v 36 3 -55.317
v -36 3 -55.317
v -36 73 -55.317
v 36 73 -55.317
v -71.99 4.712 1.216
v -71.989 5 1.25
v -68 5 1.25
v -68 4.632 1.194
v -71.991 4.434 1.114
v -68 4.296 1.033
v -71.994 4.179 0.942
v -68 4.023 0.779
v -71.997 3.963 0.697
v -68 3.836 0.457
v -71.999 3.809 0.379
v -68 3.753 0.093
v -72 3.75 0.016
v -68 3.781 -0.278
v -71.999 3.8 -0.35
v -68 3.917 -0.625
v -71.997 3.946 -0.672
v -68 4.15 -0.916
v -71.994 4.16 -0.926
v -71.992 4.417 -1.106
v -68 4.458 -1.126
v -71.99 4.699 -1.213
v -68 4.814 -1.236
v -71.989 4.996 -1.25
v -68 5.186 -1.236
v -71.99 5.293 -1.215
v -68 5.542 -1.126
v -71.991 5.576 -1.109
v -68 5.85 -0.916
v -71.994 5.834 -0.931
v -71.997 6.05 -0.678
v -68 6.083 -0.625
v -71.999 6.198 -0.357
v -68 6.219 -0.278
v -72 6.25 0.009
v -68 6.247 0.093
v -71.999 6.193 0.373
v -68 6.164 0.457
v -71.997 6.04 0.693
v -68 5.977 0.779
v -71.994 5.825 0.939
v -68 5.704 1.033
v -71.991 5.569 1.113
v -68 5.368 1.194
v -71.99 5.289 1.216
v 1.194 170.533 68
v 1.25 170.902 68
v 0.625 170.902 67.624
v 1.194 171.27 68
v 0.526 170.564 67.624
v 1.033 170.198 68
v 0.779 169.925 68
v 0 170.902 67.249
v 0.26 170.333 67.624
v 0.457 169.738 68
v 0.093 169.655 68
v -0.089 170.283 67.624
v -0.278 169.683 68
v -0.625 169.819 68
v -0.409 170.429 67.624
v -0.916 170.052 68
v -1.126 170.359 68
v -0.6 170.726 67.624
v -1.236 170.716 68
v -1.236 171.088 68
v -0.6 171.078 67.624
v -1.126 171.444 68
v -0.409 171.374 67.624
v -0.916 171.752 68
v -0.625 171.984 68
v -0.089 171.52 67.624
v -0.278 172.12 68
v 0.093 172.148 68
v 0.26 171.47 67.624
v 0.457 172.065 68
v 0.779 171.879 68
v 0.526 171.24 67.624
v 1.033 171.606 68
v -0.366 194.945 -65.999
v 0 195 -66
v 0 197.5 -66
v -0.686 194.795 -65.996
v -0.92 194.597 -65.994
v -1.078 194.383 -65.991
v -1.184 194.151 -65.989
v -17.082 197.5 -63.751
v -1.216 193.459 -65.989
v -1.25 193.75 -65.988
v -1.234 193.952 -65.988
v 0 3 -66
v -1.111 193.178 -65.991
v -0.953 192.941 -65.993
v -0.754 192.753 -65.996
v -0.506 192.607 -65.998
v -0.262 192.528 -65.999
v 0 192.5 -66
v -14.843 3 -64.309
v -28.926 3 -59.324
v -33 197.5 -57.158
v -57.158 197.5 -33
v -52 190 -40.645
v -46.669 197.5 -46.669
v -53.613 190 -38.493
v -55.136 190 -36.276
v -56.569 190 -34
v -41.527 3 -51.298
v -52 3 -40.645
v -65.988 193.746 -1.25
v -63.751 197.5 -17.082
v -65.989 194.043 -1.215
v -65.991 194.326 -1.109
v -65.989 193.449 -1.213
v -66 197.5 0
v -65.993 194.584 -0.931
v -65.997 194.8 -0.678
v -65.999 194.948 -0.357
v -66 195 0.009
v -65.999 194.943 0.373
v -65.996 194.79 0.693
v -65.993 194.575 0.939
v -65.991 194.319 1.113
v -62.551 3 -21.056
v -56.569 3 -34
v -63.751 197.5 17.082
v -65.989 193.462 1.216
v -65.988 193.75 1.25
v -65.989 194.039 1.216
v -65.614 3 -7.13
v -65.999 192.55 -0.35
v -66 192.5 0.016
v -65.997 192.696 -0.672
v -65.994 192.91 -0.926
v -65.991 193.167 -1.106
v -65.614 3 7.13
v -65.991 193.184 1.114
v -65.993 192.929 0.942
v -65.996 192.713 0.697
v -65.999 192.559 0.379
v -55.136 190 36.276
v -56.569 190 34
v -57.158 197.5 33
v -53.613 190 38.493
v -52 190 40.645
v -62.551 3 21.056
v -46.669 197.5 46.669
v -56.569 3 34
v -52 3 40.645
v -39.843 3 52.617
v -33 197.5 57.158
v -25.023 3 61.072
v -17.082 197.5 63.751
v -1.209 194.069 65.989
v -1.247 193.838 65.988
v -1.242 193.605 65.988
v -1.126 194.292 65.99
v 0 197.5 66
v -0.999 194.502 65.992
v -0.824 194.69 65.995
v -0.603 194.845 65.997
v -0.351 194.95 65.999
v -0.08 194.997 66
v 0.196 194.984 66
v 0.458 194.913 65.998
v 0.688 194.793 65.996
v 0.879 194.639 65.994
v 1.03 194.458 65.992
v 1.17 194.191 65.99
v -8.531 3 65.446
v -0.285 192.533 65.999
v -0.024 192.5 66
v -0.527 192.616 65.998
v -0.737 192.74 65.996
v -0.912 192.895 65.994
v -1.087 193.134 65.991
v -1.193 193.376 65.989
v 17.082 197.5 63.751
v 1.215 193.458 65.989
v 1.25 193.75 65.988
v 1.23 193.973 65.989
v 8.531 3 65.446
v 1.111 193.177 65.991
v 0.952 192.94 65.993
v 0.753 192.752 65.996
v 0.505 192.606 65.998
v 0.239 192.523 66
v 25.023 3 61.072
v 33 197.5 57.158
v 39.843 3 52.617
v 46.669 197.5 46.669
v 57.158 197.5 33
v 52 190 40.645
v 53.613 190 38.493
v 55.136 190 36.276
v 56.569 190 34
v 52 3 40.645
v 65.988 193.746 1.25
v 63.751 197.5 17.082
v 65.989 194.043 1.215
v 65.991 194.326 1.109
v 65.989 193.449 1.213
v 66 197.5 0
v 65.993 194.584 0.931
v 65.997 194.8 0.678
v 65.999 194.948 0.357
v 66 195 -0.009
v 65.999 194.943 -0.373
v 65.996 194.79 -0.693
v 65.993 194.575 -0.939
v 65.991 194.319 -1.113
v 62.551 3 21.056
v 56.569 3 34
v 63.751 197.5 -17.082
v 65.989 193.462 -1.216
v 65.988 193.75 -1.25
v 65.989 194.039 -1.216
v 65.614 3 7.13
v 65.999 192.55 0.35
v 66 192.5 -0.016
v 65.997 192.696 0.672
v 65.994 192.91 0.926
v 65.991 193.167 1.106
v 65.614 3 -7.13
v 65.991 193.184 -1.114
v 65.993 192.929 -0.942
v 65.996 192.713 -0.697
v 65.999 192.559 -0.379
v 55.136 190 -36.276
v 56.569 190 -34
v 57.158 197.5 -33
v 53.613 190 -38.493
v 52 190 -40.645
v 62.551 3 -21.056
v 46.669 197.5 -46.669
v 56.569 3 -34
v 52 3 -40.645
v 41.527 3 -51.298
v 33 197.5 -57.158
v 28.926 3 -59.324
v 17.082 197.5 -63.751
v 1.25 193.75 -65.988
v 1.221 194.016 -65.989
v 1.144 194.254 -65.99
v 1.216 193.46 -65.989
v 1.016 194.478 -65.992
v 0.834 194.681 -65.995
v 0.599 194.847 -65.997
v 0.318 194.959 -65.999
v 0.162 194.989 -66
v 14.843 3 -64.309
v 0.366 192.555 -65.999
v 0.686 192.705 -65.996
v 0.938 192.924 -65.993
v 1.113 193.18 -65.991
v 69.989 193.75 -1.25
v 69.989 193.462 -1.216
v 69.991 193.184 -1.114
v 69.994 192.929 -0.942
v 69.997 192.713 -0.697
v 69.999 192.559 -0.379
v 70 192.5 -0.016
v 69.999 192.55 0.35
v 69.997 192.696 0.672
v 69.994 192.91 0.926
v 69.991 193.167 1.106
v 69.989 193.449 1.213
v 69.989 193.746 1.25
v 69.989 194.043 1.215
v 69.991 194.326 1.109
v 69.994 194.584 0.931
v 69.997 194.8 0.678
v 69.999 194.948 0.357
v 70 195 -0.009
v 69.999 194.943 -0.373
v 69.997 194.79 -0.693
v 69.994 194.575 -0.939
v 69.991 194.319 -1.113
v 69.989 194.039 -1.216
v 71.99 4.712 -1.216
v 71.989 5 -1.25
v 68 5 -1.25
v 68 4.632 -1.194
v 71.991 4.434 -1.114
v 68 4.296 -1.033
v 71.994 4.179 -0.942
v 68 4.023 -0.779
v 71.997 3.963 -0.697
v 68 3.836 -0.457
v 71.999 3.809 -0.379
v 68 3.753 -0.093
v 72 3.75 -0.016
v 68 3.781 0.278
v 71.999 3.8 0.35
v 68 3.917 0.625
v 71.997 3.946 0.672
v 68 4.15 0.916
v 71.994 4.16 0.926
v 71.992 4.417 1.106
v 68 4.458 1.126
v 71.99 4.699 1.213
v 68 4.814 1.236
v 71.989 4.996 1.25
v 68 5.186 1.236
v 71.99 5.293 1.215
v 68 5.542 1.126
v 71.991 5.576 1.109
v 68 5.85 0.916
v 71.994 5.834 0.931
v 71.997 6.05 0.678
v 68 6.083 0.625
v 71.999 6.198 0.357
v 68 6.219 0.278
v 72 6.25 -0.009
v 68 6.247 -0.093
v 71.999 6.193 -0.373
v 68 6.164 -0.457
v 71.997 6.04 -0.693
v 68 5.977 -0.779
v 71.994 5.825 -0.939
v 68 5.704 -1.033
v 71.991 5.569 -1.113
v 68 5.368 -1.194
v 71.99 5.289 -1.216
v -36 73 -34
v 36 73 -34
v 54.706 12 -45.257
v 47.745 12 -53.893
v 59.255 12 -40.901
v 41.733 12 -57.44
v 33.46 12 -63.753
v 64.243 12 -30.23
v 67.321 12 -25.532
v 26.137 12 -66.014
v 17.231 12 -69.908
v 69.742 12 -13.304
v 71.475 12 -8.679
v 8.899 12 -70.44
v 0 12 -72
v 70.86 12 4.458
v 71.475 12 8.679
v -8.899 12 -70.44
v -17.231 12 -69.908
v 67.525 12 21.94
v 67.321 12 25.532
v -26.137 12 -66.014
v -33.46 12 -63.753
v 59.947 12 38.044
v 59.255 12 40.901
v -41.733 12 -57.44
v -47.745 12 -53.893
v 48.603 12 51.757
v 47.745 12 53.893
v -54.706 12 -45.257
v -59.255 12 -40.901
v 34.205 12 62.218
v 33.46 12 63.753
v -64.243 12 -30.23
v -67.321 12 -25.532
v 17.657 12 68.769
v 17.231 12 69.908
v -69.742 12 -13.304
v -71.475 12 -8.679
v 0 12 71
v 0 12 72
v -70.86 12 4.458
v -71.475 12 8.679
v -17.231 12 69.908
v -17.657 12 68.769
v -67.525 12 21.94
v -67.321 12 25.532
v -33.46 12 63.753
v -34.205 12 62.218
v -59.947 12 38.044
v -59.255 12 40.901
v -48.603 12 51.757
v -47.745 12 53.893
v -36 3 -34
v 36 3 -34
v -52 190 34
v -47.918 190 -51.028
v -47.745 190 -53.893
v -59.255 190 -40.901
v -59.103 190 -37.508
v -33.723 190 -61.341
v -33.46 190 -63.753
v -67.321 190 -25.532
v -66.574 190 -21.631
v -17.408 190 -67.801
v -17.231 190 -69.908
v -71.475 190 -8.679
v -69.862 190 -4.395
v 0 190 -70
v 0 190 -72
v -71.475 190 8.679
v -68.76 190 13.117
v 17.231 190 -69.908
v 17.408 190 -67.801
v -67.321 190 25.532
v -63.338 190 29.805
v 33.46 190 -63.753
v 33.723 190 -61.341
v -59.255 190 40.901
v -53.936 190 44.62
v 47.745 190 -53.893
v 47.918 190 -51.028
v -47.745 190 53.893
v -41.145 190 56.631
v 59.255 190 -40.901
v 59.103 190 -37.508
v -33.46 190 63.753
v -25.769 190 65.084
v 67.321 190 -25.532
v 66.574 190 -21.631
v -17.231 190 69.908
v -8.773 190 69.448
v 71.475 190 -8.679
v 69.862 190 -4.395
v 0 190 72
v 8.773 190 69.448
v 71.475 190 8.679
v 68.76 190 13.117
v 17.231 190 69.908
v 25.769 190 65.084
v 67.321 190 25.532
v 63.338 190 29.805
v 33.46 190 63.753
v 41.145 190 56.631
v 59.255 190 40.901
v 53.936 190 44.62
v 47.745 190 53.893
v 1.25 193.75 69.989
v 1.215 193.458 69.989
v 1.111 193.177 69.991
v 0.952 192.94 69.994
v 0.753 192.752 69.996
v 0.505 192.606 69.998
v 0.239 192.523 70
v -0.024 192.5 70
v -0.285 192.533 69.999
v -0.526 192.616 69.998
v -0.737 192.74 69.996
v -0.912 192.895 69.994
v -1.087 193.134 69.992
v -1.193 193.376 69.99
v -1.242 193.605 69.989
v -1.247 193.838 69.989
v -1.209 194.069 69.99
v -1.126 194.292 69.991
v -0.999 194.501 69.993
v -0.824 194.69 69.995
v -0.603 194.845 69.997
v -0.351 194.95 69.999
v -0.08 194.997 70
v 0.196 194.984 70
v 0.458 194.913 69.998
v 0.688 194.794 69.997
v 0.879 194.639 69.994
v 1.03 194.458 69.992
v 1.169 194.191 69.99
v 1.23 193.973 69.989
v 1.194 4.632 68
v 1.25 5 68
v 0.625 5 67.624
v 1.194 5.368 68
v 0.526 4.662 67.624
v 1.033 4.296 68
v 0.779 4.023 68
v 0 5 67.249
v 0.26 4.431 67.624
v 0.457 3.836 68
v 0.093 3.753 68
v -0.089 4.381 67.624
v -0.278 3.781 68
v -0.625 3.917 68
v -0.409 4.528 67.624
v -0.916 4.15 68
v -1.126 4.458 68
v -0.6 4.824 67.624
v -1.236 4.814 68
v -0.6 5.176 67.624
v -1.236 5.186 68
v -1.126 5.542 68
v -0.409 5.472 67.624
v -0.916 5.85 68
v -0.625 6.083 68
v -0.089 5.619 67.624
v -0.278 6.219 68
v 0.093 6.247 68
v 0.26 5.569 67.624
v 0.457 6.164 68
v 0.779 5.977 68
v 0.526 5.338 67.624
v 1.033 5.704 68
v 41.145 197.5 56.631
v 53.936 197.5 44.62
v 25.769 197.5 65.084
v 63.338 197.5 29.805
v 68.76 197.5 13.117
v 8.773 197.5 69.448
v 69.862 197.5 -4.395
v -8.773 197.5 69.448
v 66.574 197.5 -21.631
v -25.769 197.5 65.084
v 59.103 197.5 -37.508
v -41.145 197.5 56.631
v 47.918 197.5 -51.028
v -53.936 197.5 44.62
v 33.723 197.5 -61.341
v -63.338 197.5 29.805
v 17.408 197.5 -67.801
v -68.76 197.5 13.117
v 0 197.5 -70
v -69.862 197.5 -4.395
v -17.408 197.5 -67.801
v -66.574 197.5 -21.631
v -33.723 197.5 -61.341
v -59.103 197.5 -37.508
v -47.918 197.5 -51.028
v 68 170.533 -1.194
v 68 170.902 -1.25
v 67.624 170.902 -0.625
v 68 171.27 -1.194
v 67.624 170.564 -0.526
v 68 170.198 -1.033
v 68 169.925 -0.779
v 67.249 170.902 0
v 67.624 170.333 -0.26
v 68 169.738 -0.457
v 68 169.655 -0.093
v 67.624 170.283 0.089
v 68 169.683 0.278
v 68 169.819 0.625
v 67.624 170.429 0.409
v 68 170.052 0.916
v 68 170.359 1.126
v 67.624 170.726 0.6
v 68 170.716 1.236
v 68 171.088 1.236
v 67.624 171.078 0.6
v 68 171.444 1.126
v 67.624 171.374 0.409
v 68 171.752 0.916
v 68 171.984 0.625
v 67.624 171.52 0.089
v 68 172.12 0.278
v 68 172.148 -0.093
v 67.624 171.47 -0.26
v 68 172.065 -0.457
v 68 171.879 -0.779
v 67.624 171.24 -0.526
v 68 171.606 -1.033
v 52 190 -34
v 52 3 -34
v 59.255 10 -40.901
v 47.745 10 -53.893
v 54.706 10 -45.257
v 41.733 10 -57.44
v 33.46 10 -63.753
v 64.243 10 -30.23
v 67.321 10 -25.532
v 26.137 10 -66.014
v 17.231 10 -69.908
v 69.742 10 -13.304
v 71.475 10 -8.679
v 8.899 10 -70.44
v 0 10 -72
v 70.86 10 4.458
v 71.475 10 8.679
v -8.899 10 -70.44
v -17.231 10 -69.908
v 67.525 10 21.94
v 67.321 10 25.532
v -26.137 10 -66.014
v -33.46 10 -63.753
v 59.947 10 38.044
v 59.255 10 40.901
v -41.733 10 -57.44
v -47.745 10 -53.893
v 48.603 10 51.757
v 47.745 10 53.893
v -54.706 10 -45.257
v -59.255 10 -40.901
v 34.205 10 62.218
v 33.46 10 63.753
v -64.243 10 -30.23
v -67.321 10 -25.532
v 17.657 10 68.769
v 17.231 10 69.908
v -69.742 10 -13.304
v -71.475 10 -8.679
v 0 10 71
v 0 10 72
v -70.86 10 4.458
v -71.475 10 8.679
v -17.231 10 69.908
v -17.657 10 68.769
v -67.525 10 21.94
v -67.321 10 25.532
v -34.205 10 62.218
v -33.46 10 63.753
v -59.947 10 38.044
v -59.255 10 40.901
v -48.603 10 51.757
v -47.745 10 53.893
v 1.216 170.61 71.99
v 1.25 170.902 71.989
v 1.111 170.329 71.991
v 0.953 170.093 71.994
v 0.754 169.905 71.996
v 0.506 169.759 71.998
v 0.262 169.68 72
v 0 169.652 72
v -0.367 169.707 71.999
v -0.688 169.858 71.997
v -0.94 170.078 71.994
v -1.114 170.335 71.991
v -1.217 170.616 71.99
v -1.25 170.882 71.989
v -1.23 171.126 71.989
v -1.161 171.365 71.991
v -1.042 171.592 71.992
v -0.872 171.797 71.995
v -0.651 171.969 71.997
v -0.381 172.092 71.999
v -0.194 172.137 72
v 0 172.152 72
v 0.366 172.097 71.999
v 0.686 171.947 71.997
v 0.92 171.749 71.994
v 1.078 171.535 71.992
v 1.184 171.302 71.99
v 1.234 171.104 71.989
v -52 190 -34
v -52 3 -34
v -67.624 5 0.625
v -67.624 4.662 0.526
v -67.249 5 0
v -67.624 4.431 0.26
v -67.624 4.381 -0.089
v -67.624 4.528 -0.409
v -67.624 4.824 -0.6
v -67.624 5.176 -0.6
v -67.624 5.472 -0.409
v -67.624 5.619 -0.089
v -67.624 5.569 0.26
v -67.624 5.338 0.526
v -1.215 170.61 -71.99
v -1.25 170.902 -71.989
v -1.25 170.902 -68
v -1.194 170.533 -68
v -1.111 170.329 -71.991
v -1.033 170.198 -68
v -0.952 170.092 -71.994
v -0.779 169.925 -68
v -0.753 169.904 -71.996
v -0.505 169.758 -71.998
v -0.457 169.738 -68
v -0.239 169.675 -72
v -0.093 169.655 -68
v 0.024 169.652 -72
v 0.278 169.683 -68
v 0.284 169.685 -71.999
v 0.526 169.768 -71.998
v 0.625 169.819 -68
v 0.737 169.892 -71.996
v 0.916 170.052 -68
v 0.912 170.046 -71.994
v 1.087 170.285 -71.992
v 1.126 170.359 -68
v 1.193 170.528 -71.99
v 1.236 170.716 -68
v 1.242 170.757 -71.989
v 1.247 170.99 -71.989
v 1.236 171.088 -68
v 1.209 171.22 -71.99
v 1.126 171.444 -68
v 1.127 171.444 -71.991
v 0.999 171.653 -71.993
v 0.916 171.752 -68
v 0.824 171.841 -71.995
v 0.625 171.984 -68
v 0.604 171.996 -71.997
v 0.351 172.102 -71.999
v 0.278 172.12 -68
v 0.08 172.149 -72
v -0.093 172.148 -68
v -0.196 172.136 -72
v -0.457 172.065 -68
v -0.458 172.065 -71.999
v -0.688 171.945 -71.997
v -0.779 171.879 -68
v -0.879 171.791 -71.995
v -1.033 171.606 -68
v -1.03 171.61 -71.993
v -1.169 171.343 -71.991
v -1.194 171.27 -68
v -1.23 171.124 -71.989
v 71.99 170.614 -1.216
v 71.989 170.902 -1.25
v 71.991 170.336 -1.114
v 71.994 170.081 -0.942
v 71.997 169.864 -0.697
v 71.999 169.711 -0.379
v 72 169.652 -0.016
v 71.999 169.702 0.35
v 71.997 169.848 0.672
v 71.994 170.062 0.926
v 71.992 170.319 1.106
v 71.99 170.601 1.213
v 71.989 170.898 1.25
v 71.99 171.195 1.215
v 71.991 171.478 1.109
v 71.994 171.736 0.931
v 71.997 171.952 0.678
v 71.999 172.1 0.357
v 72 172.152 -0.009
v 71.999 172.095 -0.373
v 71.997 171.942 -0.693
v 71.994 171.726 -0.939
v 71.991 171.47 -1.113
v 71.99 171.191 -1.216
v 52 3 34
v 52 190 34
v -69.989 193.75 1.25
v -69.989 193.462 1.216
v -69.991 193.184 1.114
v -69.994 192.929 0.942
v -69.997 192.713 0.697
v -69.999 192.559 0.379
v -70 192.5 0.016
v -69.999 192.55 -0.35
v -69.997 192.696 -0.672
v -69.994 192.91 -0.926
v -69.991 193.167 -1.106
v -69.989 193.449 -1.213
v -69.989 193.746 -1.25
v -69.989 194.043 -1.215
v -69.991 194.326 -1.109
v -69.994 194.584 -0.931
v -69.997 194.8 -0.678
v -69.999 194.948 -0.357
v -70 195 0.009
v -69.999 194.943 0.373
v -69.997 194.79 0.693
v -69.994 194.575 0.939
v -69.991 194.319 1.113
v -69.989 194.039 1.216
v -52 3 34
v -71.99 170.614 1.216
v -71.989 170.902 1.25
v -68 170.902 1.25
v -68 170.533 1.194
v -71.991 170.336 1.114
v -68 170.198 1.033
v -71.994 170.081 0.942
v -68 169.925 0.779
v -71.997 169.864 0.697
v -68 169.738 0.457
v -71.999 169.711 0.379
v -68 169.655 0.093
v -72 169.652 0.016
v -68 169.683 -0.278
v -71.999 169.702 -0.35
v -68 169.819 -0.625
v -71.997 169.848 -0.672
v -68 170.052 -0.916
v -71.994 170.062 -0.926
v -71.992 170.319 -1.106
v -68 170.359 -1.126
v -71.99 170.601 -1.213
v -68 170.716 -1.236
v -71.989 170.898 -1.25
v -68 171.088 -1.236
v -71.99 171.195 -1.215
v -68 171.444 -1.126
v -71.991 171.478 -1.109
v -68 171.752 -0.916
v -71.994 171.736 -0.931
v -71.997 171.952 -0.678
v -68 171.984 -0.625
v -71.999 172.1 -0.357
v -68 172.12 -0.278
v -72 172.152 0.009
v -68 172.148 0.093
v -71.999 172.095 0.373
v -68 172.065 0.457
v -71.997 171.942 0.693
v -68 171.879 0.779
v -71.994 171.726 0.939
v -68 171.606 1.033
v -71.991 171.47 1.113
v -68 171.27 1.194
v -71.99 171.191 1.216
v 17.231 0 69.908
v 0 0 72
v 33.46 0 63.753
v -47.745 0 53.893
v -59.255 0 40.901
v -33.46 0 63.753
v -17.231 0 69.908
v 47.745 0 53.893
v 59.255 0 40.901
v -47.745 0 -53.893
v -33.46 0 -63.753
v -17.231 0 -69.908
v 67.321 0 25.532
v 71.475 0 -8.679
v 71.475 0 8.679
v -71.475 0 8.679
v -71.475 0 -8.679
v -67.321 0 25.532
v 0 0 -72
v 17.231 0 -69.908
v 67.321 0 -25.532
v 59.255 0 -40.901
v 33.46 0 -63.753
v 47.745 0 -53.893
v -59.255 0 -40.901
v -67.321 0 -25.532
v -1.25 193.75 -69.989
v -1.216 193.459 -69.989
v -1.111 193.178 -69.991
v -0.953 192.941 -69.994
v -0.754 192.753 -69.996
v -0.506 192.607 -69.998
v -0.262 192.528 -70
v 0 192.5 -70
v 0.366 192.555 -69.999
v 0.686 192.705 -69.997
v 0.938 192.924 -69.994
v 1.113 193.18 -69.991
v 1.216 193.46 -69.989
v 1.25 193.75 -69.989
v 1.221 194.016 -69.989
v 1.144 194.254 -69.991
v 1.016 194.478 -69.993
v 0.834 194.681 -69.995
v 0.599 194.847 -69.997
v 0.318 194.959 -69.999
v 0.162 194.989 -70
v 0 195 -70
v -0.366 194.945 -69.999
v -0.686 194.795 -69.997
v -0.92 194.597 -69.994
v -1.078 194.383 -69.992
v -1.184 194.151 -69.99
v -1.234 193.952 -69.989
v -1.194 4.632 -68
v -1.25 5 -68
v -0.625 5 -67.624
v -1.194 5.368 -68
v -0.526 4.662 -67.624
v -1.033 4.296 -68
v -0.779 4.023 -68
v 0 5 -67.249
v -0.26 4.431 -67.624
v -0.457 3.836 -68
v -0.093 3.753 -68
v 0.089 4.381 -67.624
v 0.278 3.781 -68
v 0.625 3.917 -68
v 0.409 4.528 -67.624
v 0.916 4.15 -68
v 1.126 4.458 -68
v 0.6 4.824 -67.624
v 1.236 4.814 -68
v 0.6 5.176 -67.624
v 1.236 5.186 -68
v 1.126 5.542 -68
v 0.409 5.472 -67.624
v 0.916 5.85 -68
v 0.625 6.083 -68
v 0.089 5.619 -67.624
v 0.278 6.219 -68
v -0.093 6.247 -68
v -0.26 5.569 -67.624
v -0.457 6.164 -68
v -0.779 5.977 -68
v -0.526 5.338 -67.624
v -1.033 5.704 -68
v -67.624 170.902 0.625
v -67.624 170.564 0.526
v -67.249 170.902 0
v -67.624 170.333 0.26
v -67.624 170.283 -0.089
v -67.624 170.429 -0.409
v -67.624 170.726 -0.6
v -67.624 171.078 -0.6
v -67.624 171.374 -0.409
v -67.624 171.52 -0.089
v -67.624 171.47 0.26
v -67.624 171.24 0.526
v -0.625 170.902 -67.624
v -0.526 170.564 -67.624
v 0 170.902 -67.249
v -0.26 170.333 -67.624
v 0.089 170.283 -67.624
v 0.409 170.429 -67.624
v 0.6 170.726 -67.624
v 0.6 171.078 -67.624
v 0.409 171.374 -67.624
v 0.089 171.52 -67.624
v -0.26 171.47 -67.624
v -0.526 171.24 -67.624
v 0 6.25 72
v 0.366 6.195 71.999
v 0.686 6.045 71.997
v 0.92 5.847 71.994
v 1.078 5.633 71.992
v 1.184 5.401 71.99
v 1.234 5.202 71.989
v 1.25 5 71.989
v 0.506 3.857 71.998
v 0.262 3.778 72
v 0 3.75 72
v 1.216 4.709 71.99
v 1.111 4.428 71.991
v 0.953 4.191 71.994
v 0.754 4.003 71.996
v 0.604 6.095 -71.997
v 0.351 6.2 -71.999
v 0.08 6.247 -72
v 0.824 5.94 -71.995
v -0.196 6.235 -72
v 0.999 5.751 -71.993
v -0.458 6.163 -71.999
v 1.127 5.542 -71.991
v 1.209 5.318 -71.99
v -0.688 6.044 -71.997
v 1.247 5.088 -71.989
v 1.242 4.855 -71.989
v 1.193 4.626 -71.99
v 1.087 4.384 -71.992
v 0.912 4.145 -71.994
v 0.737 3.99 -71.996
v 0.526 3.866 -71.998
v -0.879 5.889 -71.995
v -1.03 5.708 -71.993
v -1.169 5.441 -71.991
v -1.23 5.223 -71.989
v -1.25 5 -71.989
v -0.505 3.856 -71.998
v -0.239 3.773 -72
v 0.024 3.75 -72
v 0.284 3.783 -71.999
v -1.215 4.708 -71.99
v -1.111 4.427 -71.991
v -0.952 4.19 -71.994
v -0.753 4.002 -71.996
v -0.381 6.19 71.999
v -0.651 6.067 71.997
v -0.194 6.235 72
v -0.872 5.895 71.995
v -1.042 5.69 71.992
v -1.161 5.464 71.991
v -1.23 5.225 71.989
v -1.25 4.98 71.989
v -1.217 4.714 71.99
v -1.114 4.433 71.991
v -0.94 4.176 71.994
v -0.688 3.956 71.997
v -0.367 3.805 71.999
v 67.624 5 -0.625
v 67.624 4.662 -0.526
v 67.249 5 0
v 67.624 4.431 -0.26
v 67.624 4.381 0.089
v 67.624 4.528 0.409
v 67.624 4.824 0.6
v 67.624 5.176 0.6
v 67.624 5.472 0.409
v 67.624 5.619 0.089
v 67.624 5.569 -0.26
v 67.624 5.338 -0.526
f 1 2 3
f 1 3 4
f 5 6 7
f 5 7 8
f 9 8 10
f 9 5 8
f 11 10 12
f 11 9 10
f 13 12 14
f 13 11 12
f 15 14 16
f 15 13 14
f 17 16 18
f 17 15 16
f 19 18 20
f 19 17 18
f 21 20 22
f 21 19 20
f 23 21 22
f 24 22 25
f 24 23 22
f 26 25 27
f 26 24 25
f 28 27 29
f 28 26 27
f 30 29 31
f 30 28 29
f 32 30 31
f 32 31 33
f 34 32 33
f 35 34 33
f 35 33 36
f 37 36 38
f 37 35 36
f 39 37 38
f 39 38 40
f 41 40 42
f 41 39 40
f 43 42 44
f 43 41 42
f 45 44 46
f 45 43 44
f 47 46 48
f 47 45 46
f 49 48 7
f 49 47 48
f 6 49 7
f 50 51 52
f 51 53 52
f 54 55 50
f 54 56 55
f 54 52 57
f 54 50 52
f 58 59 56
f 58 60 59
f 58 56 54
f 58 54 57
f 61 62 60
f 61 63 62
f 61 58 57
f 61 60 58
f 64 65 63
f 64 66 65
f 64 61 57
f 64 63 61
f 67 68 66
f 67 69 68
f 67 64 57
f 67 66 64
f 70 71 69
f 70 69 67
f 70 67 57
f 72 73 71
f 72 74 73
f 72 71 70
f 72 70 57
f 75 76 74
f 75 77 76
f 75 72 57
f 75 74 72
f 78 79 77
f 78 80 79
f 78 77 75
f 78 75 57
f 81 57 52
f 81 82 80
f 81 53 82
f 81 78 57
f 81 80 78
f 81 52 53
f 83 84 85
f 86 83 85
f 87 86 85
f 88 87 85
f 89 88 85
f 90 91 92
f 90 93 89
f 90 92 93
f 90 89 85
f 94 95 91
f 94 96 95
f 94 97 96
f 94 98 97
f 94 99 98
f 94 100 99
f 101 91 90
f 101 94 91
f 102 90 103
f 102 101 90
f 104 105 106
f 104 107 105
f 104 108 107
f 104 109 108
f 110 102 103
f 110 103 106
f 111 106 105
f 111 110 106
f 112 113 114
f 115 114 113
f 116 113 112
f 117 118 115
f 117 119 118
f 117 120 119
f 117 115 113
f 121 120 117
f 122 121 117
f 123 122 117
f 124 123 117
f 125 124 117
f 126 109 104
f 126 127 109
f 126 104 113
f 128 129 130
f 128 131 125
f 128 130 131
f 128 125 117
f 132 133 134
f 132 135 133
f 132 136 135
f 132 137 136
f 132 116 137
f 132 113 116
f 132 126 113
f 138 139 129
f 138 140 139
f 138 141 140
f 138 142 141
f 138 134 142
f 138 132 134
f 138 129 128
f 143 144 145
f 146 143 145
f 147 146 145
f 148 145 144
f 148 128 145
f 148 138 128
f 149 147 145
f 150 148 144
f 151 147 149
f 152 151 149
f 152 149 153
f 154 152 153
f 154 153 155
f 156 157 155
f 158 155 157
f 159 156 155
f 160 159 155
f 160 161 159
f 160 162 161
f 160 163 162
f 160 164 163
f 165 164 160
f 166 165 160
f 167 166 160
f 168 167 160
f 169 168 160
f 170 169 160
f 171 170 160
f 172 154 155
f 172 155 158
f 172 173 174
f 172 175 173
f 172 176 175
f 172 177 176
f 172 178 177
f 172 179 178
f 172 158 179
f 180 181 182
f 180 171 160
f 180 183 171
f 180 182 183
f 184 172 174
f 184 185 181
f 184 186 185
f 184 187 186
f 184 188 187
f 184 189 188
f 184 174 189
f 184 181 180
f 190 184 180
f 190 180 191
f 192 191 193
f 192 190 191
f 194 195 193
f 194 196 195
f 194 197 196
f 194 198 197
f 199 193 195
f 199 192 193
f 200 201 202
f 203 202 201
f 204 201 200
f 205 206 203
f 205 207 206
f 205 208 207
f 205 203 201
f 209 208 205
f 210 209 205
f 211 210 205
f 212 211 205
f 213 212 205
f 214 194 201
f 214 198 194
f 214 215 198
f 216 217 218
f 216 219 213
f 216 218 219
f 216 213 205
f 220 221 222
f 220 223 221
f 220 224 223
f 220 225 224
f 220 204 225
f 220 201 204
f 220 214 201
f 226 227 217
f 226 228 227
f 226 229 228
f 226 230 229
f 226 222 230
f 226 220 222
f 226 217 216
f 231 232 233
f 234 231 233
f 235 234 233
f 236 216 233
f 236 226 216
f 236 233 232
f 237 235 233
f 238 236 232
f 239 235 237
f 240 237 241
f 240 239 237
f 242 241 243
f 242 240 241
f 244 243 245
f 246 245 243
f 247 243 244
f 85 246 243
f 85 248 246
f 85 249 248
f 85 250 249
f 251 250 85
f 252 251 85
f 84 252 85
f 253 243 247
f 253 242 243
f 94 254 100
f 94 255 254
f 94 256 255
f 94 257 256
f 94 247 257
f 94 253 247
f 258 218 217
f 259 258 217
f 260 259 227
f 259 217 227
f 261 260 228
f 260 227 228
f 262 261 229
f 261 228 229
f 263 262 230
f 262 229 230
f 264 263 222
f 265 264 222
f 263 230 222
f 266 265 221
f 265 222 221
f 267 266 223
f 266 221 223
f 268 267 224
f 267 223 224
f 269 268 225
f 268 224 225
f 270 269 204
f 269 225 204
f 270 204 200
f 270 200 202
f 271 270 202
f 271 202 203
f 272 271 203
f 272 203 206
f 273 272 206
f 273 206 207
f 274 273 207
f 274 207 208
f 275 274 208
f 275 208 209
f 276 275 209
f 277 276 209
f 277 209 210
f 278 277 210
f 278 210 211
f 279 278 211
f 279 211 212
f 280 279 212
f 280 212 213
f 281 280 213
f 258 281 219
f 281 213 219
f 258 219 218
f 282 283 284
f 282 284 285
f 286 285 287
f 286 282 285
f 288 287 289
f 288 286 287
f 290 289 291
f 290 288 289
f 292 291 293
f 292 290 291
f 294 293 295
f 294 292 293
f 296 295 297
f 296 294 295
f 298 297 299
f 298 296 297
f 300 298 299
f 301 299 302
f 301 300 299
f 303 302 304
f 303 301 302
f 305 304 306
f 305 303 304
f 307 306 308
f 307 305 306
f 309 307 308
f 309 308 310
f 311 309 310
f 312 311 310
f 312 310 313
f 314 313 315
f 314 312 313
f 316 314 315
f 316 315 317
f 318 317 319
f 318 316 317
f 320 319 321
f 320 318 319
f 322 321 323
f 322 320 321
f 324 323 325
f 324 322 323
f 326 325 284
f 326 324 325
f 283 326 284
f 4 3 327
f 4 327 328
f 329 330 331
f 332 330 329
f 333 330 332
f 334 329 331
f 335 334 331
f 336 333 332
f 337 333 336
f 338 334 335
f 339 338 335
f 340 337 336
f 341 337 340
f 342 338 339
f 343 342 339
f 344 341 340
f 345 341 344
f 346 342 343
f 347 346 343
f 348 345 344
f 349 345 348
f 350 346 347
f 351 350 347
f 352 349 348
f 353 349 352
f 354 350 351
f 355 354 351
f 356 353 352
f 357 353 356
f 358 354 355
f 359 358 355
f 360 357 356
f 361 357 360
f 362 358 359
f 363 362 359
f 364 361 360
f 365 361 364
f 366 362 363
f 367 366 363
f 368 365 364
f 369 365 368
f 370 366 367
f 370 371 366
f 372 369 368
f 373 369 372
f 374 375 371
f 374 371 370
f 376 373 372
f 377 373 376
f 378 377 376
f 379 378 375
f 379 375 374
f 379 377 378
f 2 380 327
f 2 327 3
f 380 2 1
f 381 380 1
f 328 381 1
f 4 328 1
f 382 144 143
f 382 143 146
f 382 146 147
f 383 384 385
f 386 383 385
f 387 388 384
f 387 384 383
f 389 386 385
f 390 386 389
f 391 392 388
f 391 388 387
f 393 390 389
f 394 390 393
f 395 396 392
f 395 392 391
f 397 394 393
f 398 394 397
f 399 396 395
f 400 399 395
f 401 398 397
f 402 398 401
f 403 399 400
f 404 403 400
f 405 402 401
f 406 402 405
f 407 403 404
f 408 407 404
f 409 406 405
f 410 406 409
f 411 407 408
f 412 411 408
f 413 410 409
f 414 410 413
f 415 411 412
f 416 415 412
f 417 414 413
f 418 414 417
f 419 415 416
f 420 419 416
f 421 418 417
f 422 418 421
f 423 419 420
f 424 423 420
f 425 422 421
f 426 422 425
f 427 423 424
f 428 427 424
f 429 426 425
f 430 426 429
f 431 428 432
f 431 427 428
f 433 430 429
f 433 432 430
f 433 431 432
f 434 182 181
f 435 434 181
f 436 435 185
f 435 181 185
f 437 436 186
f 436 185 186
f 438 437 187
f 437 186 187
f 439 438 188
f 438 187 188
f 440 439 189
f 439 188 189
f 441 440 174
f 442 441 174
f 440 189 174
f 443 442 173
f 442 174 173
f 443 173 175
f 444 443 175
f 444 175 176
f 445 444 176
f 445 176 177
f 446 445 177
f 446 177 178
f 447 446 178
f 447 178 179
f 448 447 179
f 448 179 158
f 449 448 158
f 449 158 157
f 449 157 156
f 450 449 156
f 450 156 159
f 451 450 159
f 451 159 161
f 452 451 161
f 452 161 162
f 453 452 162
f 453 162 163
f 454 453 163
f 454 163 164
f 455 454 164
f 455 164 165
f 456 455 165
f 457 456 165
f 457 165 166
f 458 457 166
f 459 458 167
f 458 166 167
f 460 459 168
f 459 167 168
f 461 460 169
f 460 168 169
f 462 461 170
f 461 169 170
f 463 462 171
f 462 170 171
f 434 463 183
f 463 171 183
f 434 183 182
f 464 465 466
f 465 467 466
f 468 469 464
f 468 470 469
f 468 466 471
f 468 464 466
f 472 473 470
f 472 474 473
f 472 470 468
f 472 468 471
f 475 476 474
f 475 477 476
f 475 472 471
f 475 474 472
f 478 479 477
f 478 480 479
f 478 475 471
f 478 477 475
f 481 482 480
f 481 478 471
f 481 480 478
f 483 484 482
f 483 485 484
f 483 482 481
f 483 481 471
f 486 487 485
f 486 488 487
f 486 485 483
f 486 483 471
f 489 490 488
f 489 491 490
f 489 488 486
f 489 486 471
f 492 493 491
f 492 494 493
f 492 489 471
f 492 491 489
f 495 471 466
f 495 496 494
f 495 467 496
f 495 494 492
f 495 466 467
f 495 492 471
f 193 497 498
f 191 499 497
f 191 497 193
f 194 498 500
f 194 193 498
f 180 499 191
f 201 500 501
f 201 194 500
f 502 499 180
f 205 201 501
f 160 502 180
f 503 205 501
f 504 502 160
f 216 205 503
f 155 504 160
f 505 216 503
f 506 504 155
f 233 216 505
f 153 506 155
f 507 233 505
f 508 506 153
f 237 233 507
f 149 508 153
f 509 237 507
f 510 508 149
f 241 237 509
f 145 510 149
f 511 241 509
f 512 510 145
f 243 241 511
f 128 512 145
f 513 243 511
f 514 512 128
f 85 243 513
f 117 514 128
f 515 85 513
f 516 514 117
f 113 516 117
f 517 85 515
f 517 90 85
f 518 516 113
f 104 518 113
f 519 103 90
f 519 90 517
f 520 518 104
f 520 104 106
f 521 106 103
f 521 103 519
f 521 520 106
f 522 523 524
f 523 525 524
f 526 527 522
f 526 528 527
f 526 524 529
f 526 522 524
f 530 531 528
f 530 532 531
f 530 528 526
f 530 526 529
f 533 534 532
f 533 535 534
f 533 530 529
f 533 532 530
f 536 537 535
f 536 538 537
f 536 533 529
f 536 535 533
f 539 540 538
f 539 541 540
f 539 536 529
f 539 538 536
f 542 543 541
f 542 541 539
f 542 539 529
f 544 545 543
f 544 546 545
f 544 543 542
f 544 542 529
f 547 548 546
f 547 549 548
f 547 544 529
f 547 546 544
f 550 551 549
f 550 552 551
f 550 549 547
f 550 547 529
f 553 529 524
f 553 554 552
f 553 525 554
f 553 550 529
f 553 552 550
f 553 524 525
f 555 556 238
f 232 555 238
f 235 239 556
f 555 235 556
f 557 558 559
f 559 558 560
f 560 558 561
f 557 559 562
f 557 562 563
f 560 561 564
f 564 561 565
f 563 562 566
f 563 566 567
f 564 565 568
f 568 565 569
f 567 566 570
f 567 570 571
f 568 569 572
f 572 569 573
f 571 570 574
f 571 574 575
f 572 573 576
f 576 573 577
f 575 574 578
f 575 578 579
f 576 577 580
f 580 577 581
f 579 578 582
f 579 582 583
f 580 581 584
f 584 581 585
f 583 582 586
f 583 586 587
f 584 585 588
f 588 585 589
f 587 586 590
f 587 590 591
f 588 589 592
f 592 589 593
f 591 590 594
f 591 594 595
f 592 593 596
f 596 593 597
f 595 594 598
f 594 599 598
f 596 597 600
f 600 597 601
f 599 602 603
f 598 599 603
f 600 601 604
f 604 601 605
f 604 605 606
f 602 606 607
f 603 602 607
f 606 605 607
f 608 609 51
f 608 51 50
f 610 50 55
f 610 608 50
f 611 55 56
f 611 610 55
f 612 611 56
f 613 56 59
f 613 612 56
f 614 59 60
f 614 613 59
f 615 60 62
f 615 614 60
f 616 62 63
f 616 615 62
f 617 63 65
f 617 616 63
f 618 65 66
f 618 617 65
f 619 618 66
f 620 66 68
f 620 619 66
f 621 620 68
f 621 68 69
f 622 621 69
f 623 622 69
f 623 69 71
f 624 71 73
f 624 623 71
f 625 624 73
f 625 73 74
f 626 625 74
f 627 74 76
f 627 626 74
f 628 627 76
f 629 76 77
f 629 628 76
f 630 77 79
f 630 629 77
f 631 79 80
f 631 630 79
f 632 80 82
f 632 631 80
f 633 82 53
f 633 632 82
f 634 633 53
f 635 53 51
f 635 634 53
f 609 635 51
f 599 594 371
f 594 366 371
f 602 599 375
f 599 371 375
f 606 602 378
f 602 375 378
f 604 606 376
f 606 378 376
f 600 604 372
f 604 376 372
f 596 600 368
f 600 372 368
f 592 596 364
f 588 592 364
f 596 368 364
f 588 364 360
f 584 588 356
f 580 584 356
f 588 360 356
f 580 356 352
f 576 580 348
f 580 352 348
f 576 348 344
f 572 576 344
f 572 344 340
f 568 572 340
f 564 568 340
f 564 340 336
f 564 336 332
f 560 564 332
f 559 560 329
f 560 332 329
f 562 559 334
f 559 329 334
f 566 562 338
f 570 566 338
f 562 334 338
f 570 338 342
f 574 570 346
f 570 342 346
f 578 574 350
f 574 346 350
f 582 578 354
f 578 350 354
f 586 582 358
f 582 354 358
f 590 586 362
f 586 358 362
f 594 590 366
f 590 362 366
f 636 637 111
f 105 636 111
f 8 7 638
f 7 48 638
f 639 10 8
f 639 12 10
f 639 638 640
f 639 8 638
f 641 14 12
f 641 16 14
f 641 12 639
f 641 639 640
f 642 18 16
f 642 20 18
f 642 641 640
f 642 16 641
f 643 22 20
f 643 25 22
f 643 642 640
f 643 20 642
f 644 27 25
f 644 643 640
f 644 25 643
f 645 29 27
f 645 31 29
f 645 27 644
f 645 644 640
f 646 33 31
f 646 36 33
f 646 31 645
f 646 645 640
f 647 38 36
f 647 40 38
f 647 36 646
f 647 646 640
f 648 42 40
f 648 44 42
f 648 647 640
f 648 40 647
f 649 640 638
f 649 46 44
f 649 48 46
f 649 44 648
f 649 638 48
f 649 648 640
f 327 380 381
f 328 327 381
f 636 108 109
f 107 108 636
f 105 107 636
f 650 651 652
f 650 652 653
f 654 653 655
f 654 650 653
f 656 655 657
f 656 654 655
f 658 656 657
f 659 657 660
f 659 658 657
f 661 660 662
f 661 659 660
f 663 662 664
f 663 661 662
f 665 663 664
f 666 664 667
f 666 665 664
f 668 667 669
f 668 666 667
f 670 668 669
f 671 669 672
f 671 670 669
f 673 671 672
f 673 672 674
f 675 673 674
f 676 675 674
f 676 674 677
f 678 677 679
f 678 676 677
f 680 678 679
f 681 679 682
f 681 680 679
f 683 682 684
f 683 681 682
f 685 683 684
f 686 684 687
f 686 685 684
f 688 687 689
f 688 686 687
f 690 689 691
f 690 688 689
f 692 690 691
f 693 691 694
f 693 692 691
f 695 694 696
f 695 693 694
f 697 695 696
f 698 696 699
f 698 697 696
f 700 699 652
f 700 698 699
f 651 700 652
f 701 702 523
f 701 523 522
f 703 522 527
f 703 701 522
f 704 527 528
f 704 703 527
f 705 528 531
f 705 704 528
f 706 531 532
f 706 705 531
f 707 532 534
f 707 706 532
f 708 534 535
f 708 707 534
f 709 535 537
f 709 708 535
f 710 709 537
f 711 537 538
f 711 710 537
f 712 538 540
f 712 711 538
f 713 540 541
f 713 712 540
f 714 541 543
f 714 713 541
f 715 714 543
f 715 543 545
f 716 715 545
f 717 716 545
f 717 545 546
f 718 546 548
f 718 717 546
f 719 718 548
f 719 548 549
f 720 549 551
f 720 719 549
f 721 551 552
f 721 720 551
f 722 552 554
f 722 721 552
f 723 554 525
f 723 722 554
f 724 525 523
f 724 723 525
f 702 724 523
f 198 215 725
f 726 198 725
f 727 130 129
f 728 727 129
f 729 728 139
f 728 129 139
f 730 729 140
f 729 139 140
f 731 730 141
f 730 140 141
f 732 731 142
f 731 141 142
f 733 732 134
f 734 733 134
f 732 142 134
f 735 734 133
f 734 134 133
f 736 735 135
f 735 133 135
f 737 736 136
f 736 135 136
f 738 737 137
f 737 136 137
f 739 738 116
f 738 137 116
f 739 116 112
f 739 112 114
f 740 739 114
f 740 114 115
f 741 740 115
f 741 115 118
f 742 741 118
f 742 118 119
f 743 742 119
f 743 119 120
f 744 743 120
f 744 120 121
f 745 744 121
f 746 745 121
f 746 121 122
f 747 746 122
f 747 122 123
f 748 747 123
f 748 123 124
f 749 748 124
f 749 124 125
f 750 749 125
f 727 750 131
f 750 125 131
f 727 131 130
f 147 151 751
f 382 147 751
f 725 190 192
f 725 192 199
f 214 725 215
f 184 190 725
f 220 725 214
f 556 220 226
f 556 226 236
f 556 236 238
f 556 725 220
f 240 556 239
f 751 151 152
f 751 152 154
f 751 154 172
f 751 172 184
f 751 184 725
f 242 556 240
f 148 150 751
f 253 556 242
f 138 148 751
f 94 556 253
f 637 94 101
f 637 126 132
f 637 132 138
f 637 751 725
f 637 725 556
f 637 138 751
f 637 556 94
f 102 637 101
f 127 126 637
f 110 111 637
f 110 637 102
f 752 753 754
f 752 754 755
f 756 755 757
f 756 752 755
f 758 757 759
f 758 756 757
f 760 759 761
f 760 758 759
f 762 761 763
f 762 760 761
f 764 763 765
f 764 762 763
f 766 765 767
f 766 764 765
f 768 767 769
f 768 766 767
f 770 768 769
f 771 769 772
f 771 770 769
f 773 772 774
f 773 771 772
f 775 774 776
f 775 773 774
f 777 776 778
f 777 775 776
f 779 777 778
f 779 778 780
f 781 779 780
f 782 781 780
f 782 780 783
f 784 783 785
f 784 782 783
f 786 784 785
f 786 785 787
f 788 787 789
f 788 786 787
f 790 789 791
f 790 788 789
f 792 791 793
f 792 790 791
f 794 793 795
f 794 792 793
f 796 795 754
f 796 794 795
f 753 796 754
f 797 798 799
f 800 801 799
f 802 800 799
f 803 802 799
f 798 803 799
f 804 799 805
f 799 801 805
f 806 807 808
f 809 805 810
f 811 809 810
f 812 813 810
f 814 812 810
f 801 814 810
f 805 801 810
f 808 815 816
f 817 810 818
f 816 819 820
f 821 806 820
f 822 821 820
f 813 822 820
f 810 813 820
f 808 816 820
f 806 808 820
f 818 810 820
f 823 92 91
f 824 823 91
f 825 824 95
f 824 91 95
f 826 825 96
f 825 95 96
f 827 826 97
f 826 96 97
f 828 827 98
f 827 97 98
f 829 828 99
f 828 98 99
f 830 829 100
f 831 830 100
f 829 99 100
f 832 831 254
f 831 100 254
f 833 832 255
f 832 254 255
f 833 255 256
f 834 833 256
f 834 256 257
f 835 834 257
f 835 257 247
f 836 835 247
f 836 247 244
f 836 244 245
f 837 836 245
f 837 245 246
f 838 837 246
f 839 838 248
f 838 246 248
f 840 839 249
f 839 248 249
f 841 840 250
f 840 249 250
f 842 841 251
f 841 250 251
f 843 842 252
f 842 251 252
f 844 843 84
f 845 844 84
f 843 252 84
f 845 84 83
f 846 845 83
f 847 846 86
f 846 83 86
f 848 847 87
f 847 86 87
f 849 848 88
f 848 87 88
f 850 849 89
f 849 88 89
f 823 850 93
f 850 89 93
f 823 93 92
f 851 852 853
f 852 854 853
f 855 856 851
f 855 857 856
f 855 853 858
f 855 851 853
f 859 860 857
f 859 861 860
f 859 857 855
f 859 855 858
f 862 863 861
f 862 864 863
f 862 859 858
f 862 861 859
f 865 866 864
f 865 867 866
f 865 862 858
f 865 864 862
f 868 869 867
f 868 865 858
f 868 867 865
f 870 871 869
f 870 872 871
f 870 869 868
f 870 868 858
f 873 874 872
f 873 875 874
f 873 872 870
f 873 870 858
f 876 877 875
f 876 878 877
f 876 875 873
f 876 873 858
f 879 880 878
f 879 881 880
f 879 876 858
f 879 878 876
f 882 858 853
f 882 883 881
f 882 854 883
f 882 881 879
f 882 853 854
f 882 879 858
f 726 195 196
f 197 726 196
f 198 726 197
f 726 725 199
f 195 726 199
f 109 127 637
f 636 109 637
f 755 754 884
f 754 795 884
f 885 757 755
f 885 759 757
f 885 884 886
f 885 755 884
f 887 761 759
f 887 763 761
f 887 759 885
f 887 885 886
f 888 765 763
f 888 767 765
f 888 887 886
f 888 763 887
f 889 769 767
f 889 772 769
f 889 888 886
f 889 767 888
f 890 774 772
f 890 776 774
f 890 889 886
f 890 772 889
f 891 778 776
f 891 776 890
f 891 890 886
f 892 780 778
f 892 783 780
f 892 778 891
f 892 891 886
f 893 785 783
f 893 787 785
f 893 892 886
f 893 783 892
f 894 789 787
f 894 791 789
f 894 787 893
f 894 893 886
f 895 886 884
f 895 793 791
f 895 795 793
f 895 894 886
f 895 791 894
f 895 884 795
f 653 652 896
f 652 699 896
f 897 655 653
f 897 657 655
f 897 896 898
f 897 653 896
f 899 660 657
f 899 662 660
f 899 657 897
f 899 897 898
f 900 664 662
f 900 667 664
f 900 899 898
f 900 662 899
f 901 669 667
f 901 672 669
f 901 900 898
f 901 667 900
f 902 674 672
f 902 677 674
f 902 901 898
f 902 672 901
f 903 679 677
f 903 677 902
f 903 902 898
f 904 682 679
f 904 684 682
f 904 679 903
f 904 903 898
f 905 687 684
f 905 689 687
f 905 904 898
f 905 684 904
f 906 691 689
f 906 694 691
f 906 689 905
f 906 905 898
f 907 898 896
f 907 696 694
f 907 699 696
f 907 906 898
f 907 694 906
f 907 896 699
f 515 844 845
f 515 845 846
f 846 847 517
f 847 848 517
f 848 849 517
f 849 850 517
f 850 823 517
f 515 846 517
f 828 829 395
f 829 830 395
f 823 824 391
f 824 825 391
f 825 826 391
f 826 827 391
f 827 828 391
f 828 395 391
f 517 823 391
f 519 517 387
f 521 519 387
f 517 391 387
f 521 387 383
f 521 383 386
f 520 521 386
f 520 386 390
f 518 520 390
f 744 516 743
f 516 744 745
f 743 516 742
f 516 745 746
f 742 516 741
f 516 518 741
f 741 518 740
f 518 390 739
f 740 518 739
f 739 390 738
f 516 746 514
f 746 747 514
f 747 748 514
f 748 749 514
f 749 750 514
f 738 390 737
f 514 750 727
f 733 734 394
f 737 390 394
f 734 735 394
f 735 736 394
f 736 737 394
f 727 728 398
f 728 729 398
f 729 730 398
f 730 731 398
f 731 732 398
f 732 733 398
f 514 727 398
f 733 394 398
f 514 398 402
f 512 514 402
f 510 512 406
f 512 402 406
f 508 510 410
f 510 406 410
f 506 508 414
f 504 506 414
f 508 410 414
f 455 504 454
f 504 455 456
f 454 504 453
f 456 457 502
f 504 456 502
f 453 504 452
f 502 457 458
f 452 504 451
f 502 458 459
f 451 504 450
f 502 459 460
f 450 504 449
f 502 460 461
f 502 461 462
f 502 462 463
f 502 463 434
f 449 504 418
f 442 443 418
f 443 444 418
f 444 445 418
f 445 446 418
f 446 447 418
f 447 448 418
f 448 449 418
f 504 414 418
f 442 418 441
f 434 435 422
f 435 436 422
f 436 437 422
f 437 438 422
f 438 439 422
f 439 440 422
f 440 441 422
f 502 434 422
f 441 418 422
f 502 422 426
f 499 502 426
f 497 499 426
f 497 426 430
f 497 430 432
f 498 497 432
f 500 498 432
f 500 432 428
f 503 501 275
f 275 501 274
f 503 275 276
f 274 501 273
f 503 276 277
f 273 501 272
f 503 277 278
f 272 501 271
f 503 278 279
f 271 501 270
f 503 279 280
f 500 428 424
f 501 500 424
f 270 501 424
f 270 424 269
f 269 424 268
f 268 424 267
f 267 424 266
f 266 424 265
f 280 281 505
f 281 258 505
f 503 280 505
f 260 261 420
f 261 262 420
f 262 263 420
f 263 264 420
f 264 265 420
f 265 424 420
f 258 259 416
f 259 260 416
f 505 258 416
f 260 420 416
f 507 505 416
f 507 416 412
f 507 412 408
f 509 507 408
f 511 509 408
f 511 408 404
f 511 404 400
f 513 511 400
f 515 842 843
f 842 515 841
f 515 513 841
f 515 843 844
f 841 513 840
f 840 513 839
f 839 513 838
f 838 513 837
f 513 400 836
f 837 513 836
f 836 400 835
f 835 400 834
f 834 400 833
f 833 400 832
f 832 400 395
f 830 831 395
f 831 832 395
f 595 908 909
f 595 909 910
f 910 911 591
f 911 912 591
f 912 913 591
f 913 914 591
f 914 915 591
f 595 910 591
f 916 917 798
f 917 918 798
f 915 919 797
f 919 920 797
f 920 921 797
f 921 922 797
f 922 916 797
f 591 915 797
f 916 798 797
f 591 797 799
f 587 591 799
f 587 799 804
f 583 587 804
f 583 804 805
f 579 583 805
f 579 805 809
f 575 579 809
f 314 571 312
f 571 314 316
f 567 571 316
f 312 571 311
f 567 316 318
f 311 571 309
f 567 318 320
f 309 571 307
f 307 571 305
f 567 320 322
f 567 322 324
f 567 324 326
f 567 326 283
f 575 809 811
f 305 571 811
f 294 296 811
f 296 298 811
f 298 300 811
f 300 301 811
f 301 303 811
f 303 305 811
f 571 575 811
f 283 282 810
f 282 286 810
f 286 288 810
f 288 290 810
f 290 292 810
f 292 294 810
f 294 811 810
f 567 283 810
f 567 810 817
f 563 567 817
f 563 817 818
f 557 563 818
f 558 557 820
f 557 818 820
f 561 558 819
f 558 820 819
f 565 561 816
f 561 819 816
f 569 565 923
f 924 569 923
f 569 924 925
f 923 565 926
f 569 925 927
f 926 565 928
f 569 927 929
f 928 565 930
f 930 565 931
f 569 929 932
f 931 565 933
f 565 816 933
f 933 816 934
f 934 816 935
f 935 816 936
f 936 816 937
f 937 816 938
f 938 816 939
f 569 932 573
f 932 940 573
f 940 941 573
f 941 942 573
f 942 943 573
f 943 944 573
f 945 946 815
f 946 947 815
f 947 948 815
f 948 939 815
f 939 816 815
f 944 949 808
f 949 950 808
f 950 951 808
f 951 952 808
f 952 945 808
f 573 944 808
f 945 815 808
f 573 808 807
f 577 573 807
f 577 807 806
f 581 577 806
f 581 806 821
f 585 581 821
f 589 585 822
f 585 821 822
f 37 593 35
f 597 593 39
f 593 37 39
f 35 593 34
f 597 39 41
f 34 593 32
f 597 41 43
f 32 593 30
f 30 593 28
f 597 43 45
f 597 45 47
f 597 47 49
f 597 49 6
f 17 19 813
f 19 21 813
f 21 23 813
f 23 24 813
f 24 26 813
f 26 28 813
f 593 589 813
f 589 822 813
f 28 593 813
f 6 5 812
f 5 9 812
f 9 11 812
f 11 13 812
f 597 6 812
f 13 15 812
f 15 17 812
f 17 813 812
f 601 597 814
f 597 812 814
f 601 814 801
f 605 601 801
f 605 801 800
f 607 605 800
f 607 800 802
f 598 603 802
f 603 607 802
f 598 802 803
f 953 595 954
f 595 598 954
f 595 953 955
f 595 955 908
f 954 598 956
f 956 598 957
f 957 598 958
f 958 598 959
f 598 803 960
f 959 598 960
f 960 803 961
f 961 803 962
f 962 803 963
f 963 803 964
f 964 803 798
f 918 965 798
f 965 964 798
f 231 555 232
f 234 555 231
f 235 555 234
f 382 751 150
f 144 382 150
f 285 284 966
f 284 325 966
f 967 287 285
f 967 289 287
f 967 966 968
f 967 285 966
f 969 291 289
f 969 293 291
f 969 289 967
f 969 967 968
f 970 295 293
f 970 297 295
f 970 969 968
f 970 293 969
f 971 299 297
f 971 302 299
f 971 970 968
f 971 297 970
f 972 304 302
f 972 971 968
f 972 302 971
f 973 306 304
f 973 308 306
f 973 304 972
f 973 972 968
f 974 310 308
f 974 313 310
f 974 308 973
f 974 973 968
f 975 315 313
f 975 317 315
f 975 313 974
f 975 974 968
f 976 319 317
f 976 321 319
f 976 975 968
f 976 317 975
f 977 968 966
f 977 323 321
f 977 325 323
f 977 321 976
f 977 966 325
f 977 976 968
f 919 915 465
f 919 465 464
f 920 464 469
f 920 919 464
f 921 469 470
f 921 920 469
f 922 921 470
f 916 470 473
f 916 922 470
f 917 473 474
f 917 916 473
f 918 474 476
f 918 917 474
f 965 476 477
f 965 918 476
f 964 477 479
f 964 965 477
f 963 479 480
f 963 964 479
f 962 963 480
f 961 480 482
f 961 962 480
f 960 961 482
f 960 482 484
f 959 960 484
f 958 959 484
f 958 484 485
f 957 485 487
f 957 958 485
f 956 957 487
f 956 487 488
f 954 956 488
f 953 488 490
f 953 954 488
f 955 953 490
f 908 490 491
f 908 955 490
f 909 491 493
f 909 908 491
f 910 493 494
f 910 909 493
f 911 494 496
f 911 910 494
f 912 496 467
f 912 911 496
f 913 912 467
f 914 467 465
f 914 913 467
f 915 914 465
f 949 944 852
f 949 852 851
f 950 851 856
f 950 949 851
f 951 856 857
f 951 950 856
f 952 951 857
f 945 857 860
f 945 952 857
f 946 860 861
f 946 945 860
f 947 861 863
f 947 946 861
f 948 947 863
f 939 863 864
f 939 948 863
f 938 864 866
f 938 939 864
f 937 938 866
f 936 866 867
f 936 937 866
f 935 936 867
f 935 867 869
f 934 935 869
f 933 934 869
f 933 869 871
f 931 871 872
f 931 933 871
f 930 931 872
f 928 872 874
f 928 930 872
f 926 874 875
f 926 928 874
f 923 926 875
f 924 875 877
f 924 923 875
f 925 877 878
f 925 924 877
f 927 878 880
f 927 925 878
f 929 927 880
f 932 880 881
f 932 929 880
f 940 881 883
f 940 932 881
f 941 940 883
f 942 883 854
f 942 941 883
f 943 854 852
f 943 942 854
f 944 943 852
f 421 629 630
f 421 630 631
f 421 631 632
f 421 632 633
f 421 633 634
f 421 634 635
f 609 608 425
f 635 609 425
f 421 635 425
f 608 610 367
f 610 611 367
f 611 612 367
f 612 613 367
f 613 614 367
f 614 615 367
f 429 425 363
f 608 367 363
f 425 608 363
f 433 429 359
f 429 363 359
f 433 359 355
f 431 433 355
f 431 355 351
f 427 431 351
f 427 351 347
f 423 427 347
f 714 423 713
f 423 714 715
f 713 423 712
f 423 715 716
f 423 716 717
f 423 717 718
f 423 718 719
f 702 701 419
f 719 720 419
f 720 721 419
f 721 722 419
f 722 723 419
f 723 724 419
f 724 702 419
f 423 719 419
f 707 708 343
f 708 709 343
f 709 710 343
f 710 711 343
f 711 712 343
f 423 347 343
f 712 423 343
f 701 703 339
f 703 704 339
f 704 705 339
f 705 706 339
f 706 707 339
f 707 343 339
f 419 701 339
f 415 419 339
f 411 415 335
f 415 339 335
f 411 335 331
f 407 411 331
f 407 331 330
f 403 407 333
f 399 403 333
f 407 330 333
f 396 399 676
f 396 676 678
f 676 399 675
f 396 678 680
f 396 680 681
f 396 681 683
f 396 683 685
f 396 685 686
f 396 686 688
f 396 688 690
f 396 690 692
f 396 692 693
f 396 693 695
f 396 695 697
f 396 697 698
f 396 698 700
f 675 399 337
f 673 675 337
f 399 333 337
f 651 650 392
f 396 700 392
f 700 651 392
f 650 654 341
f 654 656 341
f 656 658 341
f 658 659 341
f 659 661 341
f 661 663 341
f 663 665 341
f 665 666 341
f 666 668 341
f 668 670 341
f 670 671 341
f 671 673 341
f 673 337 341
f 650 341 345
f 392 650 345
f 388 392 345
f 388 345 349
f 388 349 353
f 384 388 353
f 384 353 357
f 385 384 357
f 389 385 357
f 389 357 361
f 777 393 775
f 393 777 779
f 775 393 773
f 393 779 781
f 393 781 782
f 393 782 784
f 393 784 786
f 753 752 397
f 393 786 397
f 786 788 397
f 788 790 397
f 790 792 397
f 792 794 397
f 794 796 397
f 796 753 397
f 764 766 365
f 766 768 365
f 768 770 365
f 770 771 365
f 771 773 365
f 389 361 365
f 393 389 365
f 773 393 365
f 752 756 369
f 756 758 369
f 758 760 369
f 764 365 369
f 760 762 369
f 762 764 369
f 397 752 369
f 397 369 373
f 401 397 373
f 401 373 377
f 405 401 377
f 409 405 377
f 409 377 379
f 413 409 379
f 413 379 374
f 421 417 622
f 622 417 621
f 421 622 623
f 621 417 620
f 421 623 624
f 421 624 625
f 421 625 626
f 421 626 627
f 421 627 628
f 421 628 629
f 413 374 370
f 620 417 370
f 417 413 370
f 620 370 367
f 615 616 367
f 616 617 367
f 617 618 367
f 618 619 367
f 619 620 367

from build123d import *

# Parameters (mm, degrees)
SKETCH_6_R               = 72
SKETCH_6_R_2             = 70
EXTRUDE_1_DEPTH          = 190
SKETCH_6_15_R            = 70
SKETCH_6_15_R_2          = 66
EXTRUDE_2_DEPTH          = 197.5
SKETCH_6_16_R            = 66
EXTRUDE_3_DEPTH          = 3
EXTRUDE_6_DEPTH          = 190
F_2_5MM_3_D              = 2.5
F_2_5MM_3_DEPTH          = 70
PATTERN_CIRCULAR_1_COUNT = 4
SKETCH_33_W              = 1
SKETCH_33_H              = 2
PATTERN_CIRCULAR_2_COUNT = 4
PATTERN_CIRCULAR_3_COUNT = 4
SKETCH_40_W              = 72
SKETCH_40_H              = 21.317266744
EXTRUDE_8_DEPTH          = 70


with BuildPart() as part:
    # 草圖6 → 填料-伸長1 (new body)
    with BuildSketch(Plane(origin=(0, 0, 0), x_dir=(1, 0, 0), z_dir=(0, 1, 0))):
        with Locations(Location((0, 0, 0), (0, 0, 270))):
            Circle(SKETCH_6_R)
        with Locations(Location((0, 0, 0), (0, 0, 270))):
            Circle(SKETCH_6_R_2, mode=Mode.SUBTRACT)
    extrude(amount=EXTRUDE_1_DEPTH)

    # 草圖6<15> → 填料-伸長2 (add)
    with BuildSketch(Plane(origin=(0, 0, 0), x_dir=(1, 0, 0), z_dir=(0, 1, 0))):
        with Locations(Location((0, 0, 0), (0, 0, 90))):
            Circle(SKETCH_6_15_R)
        with Locations(Location((0, 0, 0), (0, 0, 90))):
            Circle(SKETCH_6_15_R_2, mode=Mode.SUBTRACT)
    extrude(amount=EXTRUDE_2_DEPTH)

    # 草圖6<16> → 填料-伸長3 (add)
    with BuildSketch(Plane(origin=(0, 0, 0), x_dir=(1, 0, 0), z_dir=(0, 1, 0))):
        with Locations(Location((0, 0, 0), (0, 0, 90))):
            Circle(SKETCH_6_16_R)
    extrude(amount=EXTRUDE_3_DEPTH)

    # 草圖9 → 填料-伸長6 (add)
    with BuildSketch(Plane(origin=(0, 0, 0), x_dir=(1, 0, 0), z_dir=(0, 1, 0))):
        with BuildLine():
            Line((-52, 34), (-52, 40.644802866))
            ThreePointArc((-52, 40.644802866), (-54.38584794, 37.392239086), (-56.568542495, 34))
            Line((-56.568542495, 34), (-52, 34))
        make_face()
        with BuildLine():
            Line((-52, -34), (-56.568542495, -34))
            ThreePointArc((-56.568542495, -34), (-54.38584794, -37.392239086), (-52, -40.644802866))
            Line((-52, -40.644802866), (-52, -34))
        make_face()
        with BuildLine():
            Line((56.568542495, -34), (52, -34))
            Line((52, -34), (52, -40.644802866))
            ThreePointArc((52, -40.644802866), (54.38584794, -37.392239086), (56.568542495, -34))
        make_face()
        with BuildLine():
            ThreePointArc((56.568542495, 34), (54.38584794, 37.392239086), (52, 40.644802866))
            Line((52, 40.644802866), (52, 34))
            Line((52, 34), (56.568542495, 34))
        make_face()
    extrude(amount=EXTRUDE_6_DEPTH)

    # Ø2.5mm 定位孔3
    with Locations(Plane(origin=(70, 193.75, 0), x_dir=(0, 0, 1), z_dir=(1, 0, 0))):
        with Locations((0, 0)):
            f_2_5mm_3 = Hole(F_2_5MM_3_D / 2, depth=F_2_5MM_3_DEPTH)

    # 環狀複製排列1: Ø2.5mm 定位孔3 ×4 about axis
    pattern_circular_1_axis = Axis((0, 197.5, 0), (0, 1, 0))
    for i in range(1, PATTERN_CIRCULAR_1_COUNT):
        add(f_2_5mm_3.rotate(pattern_circular_1_axis, i * 360 / PATTERN_CIRCULAR_1_COUNT), mode=Mode.SUBTRACT)

    # 草圖33 → 除料-旋轉1 (revolve, cut)
    with BuildSketch(Plane.XY, mode=Mode.PRIVATE) as cut_revolve_1_sk:
        with Locations((-71.5, 11)):
            Rectangle(SKETCH_33_W, SKETCH_33_H)
    revolve(cut_revolve_1_sk.sketch.rotate(Axis((0, 197.5, 0), (0, -1, 0)), 270), axis=Axis((0, 197.5, 0), (0, -1, 0)), mode=Mode.SUBTRACT)

    # 草圖37 → Ø2.5mm 定位孔4 (revolve, cut)
    with BuildSketch(Plane(origin=(-72, 5, 0), x_dir=(0, 0, 1), z_dir=(0, 1, 0))):
        Polygon((0, 0), (0, 4.751075774), (1.25, 4), (1.25, 0), align=None)
    f_2_5mm_4 = revolve(axis=Axis((-78.35, 5, 0), (1, 0, 0)), mode=Mode.SUBTRACT)

    # 環狀複製排列2: Ø2.5mm 定位孔4 ×4 about axis
    pattern_circular_2_axis = Axis((0, 197.5, 0), (0, -1, 0))
    for i in range(1, PATTERN_CIRCULAR_2_COUNT):
        add(f_2_5mm_4.rotate(pattern_circular_2_axis, i * 360 / PATTERN_CIRCULAR_2_COUNT), mode=Mode.SUBTRACT)

    # 草圖38 → Ø2.5mm 定位孔5 (revolve, cut)
    with BuildSketch(Plane(origin=(-72, 170.901826282, 0), x_dir=(0, 0, 1), z_dir=(0, 1, 0))):
        Polygon((0, 0), (0, 4.751075774), (1.25, 4), (1.25, 0), align=None)
    f_2_5mm_5 = revolve(axis=Axis((-78.35, 170.901826282, 0), (1, 0, 0)), mode=Mode.SUBTRACT)

    # 環狀複製排列3: Ø2.5mm 定位孔5 ×4 about axis
    pattern_circular_3_axis = Axis((0, 197.5, 0), (0, -1, 0))
    for i in range(1, PATTERN_CIRCULAR_3_COUNT):
        add(f_2_5mm_5.rotate(pattern_circular_3_axis, i * 360 / PATTERN_CIRCULAR_3_COUNT), mode=Mode.SUBTRACT)


with BuildPart() as body_2:
    # 草圖40 → 填料-伸長8 (new body)
    with BuildSketch(Plane(origin=(0, 3, 0), x_dir=(1, 0, 0), z_dir=(0, 1, 0))):
        with Locations((0, 44.658633372)):
            Rectangle(SKETCH_40_W, SKETCH_40_H)
    extrude(amount=EXTRUDE_8_DEPTH)


solid = Compound([part.part, body_2.part])
